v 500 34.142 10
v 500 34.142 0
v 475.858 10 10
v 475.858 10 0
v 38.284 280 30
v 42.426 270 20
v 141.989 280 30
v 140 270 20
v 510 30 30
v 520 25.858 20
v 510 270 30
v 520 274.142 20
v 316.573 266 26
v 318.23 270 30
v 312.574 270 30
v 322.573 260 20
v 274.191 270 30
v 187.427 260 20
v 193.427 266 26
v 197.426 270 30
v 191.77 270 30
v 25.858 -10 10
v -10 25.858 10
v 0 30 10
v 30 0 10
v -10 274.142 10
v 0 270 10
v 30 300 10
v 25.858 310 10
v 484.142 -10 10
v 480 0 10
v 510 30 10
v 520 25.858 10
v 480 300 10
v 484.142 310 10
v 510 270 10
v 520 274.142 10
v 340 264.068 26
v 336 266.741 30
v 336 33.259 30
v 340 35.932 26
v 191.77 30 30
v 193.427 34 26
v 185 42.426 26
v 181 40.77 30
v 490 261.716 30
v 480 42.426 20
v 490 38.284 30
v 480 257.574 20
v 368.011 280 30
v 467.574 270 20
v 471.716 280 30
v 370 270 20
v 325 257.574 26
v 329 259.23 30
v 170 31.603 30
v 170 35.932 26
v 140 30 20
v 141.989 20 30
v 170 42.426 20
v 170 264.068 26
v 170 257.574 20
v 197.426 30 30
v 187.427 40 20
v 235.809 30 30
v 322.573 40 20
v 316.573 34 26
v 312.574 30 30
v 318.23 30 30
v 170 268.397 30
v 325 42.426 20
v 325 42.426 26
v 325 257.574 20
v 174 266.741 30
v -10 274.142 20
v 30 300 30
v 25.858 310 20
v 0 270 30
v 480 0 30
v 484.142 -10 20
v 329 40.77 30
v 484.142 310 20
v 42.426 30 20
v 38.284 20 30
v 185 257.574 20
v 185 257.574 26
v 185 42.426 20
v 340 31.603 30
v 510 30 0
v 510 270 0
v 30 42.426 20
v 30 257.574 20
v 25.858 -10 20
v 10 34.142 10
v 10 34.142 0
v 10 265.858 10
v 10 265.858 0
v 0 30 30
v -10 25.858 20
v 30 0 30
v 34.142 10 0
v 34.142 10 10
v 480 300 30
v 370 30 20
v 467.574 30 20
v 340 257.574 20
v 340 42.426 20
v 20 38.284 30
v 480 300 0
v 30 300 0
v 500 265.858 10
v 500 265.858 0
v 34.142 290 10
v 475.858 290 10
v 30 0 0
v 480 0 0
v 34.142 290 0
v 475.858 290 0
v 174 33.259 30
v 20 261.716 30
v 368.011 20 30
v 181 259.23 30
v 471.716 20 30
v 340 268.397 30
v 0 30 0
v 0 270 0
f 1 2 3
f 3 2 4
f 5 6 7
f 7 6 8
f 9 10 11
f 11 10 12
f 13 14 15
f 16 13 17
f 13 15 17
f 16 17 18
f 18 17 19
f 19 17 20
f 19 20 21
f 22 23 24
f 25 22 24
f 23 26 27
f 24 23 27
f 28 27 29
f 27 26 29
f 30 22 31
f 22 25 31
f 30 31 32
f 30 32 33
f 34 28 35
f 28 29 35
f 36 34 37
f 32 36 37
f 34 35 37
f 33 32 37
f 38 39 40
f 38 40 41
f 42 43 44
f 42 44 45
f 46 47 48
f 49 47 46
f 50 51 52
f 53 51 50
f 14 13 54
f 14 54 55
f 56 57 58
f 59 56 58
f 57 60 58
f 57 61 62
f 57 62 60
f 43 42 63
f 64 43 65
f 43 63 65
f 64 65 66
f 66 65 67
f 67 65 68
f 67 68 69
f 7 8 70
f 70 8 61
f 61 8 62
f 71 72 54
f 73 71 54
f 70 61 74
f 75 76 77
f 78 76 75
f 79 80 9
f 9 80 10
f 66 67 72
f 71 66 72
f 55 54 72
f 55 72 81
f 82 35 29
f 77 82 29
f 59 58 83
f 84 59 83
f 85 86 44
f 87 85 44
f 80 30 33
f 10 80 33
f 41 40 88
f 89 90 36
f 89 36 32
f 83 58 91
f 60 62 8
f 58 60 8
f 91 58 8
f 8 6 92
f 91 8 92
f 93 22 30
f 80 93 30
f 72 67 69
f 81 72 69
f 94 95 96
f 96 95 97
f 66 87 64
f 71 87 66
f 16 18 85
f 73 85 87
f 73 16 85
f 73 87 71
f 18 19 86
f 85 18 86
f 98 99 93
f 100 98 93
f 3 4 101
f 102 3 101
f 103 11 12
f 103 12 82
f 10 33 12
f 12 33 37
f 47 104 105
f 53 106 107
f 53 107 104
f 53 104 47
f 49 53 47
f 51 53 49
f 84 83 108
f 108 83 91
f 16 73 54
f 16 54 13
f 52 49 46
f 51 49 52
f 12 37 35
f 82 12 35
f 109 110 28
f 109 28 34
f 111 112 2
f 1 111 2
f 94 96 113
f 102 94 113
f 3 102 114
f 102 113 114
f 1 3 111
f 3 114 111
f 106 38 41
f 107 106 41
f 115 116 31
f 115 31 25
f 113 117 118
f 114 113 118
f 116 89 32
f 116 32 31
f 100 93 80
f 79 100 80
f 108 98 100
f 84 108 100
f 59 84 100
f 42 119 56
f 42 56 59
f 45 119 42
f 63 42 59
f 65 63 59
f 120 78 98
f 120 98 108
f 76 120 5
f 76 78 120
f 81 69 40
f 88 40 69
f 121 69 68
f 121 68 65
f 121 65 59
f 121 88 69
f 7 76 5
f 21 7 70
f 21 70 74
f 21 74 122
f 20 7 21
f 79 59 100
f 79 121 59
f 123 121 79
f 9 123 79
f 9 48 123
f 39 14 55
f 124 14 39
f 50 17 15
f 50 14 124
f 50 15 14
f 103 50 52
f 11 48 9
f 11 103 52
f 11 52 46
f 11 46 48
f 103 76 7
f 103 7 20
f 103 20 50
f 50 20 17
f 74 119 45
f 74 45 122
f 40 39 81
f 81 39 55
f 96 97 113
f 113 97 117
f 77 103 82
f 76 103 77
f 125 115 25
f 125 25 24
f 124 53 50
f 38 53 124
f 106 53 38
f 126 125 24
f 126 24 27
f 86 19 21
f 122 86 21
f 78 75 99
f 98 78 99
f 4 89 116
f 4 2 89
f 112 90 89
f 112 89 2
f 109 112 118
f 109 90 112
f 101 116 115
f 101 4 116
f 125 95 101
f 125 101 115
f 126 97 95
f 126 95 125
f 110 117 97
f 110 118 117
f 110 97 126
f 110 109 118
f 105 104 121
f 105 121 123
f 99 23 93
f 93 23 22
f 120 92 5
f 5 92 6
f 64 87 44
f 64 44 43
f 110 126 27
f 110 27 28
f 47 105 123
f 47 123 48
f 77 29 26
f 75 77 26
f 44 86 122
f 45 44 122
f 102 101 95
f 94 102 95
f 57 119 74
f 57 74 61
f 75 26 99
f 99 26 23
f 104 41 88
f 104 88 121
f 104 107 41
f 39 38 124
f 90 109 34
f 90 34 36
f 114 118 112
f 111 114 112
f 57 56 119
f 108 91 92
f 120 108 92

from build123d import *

# Parameters (mm, degrees)
BOSS_EXTRU_1_DEPTH      = 10
BOSS_EXTRU_2_DEPTH      = 20
ENL_V_MAT_EXTRU_1_DEPTH = 10
CHANFREIN1_SIZE         = 10
CHANFREIN2_SIZE         = 10
CHANFREIN3_SIZE         = 4


# Some blends are built 0.0001 mm under size
with BuildPart() as part:
    # Esquisse1 → Boss.-Extru.1 (new body)
    with BuildSketch(Plane.XY):
        Polygon((0, 270), (30, 300), (480, 300), (510, 270), (510, 30), (480, 0), (30, 0), (0, 30), align=None)
        Polygon((10, 265.857864376), (34.142135624, 290), (475.857864376, 290), (500, 265.857864376), (500, 34.142135624), (475.857864376, 10), (34.142135624, 10), (10, 34.142135624), align=None, mode=Mode.SUBTRACT)
    extrude(amount=BOSS_EXTRU_1_DEPTH)

    # Esquisse2 → Boss.-Extru.2 (add)
    with BuildSketch(Plane.XY.offset(10)):
        Polygon((484.142135624, 310), (25.857864376, 310), (-10, 274.142135624), (-10, 25.857864376), (25.857864376, -10), (484.142135624, -10), (520, 25.857864376), (520, 274.142135624), align=None)
    extrude(amount=BOSS_EXTRU_2_DEPTH)

    # Esquisse3 → Enlèv. mat.-Extru.1 (cut)
    with BuildSketch(Plane.XY.offset(30)):
        Polygon((42.426406871, 270), (140, 270), (170, 257.573593129), (170, 42.426406871), (140, 30), (42.426406871, 30), (30, 42.426406871), (30, 257.573593129), align=None)
        Polygon((480, 257.573593129), (467.573593129, 270), (370, 270), (340, 257.573593129), (340, 42.426406871), (370, 30), (467.573593129, 30), (480, 42.426406871), align=None)
        Polygon((197.426406871, 270), (185, 257.573593129), (185, 42.426406871), (197.426406871, 30), (312.573593129, 30), (325, 42.426406871), (325, 257.573593129), (312.573593129, 270), (255, 270), align=None)
    extrude(amount=-ENL_V_MAT_EXTRU_1_DEPTH, mode=Mode.SUBTRACT)

    # Chanfrein1
    chanfrein1_edges = [part.edges().sort_by_distance(p)[0] for p in [
        (520, 150, 30),
        (502.071067812, 7.928932188, 30),
        (255, -10, 30),
        (7.928932188, 7.928932188, 30),
        (-10, 150, 30),
        (7.928932188, 292.071067812, 30),
        (255, 310, 30),
        (502.071067812, 292.071067812, 30),
        (473.786796564, 263.786796564, 30),
        (418.786796564, 270, 30),
        (355, 263.786796564, 30),
        (355, 36.213203436, 30),
        (418.786796564, 30, 30),
        (473.786796564, 36.213203436, 30),
        (480, 150, 30),
        (155, 36.213203436, 30),
        (155, 263.786796564, 30),
        (91.213203436, 270, 30),
        (36.213203436, 263.786796564, 30),
        (30, 150, 30),
        (36.213203436, 36.213203436, 30),
        (91.213203436, 30, 30),
    ]]
    chamfer(chanfrein1_edges, length=CHANFREIN1_SIZE - 0.0001)  # a hair under: the kernel refuses the full size

    # Chanfrein2
    chanfrein2_edges = [part.edges().sort_by_distance(p)[0] for p in [
        (255, 30, 20),
        (255, 270, 20),
    ]]
    chamfer(chanfrein2_edges, length=CHANFREIN2_SIZE - 0.0001)  # a hair under: the kernel refuses the full size

    # Chanfrein3
    # the kernel refuses this chamfer: 4 mm, written as the material it takes off along each edge
    with BuildSketch(Plane(origin=(340, 21.315861156, 30), x_dir=(-0.9996219169112968, 0, 0.027495876610586605), z_dir=(0, 1, 0))) as chanfrein3_piece_1_section:
        Polygon((CHANFREIN3_SIZE * 0.999621916911, -CHANFREIN3_SIZE * 0.0274958766106), (-CHANFREIN3_SIZE * 0.0274958766106, -CHANFREIN3_SIZE * 0.999621916911), (0, 0), align=None)
    chanfrein3_piece_1 = extrude(amount=257.368277689, mode=Mode.PRIVATE)
    chanfrein3_piece_1 = split(chanfrein3_piece_1, bisect_by=Plane(origin=(318.097162936, 199.689892736, -25.095613192), z_dir=(0.27059805007309734, -0.6532814824381883, 0.707106781186548)), keep=Keep.TOP, mode=Mode.PRIVATE)
    chanfrein3_piece_1 = split(chanfrein3_piece_1, bisect_by=Plane(origin=(318.097162936, 100.310107264, -25.095613192), z_dir=(0.27059805007309695, 0.6532814824381893, 0.7071067811865472)), keep=Keep.TOP, mode=Mode.PRIVATE)
    add(chanfrein3_piece_1, mode=Mode.SUBTRACT)
    with BuildSketch(Plane(origin=(170, 278.684138844, 30), x_dir=(0.9996219169112968, 0, 0.027495876610586414), z_dir=(0, -1, 0))) as chanfrein3_piece_2_section:
        Polygon((CHANFREIN3_SIZE * 0.999621916911, -CHANFREIN3_SIZE * 0.0274958766106), (-CHANFREIN3_SIZE * 0.0274958766106, -CHANFREIN3_SIZE * 0.999621916911), (0, 0), align=None)
    chanfrein3_piece_2 = extrude(amount=257.368277689, mode=Mode.PRIVATE)
    chanfrein3_piece_2 = split(chanfrein3_piece_2, bisect_by=Plane(origin=(191.902837064, 100.310107264, -25.095613192), z_dir=(-0.27059805007309856, 0.6532814824381883, 0.7071067811865475)), keep=Keep.TOP, mode=Mode.PRIVATE)
    chanfrein3_piece_2 = split(chanfrein3_piece_2, bisect_by=Plane(origin=(191.902837064, 199.689892736, -25.095613192), z_dir=(-0.2705980500730966, -0.6532814824381884, 0.7071067811865482)), keep=Keep.TOP, mode=Mode.PRIVATE)
    add(chanfrein3_piece_2, mode=Mode.SUBTRACT)
    with BuildSketch(Plane(origin=(332.273817919, 250.299775209, 30), x_dir=(-0.019442520806006888, -0.019442520806006888, -0.999621916911297), z_dir=(-0.7071067811865476, 0.7071067811865476, 0))) as chanfrein3_piece_3_section:
        Polygon((CHANFREIN3_SIZE * 0.999621916911, -CHANFREIN3_SIZE * 0.0274958766106), (-CHANFREIN3_SIZE * 0.0274958766106, -CHANFREIN3_SIZE * 0.999621916911), (0, 0), align=None)
    chanfrein3_piece_3 = extrude(amount=38.147057033, mode=Mode.PRIVATE)
    chanfrein3_piece_3 = split(chanfrein3_piece_3, bisect_by=Plane(origin=(320.298394929, 266.355378959, 26.355278959), z_dir=(0, -0.7071067811865467, 0.7071067811865485)), keep=Keep.TOP, mode=Mode.PRIVATE)
    chanfrein3_piece_3 = split(chanfrein3_piece_3, bisect_by=Plane(origin=(320.298394929, 270, 28.707260693), z_dir=(0, -1, 0)), keep=Keep.TOP, mode=Mode.PRIVATE)
    chanfrein3_piece_3 = split(chanfrein3_piece_3, bisect_by=Plane(origin=(325, 264.003397225, 28.707260693), z_dir=(-1, 0, 0)), keep=Keep.TOP, mode=Mode.PRIVATE)
    add(chanfrein3_piece_3, mode=Mode.SUBTRACT)
    with BuildSketch(Plane(origin=(204.700224791, 277.273817919, 30), x_dir=(0.019442520806013792, -0.019442520806013792, -0.9996219169112968), z_dir=(-0.7071067811865476, -0.7071067811865476, 0))) as chanfrein3_piece_4_section:
        Polygon((CHANFREIN3_SIZE * 0.999621916911, -CHANFREIN3_SIZE * 0.0274958766106), (-CHANFREIN3_SIZE * 0.0274958766106, -CHANFREIN3_SIZE * 0.999621916911), (0, 0), align=None)
    chanfrein3_piece_4 = extrude(amount=38.147057033, mode=Mode.PRIVATE)
    chanfrein3_piece_4 = split(chanfrein3_piece_4, bisect_by=Plane(origin=(189.701605071, 270, 28.707260693), z_dir=(0, -1, 0)), keep=Keep.TOP, mode=Mode.PRIVATE)
    chanfrein3_piece_4 = split(chanfrein3_piece_4, bisect_by=Plane(origin=(189.701605071, 266.355378959, 26.355278959), z_dir=(0, -0.7071067811865467, 0.7071067811865485)), keep=Keep.TOP, mode=Mode.PRIVATE)
    chanfrein3_piece_4 = split(chanfrein3_piece_4, bisect_by=Plane(origin=(185, 264.003397225, 28.707260693), z_dir=(1, 0, 0)), keep=Keep.TOP, mode=Mode.PRIVATE)
    add(chanfrein3_piece_4, mode=Mode.SUBTRACT)
    with BuildSketch(Plane(origin=(185, 267.860325081, 30), x_dir=(0.02749587661058907, 0, -0.9996219169112965), z_dir=(0, -1, 0))) as chanfrein3_piece_5_section:
        Polygon((CHANFREIN3_SIZE * 0.999621916911, -CHANFREIN3_SIZE * 0.0274958766106), (-CHANFREIN3_SIZE * 0.0274958766106, -CHANFREIN3_SIZE * 0.999621916911), (0, 0), align=None)
    chanfrein3_piece_5 = extrude(amount=235.720650161, mode=Mode.PRIVATE)
    chanfrein3_piece_5 = split(chanfrein3_piece_5, bisect_by=Plane(origin=(130.558397351, 203.13199048, 28.675713426), z_dir=(0.7071067811865476, -0.7071067811865476, 0)), keep=Keep.TOP, mode=Mode.PRIVATE)
    chanfrein3_piece_5 = split(chanfrein3_piece_5, bisect_by=Plane(origin=(130.558397351, 96.86800952, 28.675713426), z_dir=(0.7071067811865475, 0.7071067811865477, 0)), keep=Keep.TOP, mode=Mode.PRIVATE)
    add(chanfrein3_piece_5, mode=Mode.SUBTRACT)
    with BuildSketch(Plane(origin=(177.726182081, 49.700224791, 30), x_dir=(0.01944252080601465, 0.019442520806014656, -0.9996219169112968), z_dir=(0.7071067811865477, -0.7071067811865475, 0))) as chanfrein3_piece_6_section:
        Polygon((CHANFREIN3_SIZE * 0.999621916911, -CHANFREIN3_SIZE * 0.0274958766106), (-CHANFREIN3_SIZE * 0.0274958766106, -CHANFREIN3_SIZE * 0.999621916911), (0, 0), align=None)
    chanfrein3_piece_6 = extrude(amount=38.147057033, mode=Mode.PRIVATE)
    chanfrein3_piece_6 = split(chanfrein3_piece_6, bisect_by=Plane(origin=(185, 35.996602775, 28.707260693), z_dir=(1, 0, 0)), keep=Keep.TOP, mode=Mode.PRIVATE)
    chanfrein3_piece_6 = split(chanfrein3_piece_6, bisect_by=Plane(origin=(189.701605071, 30, 28.707260693), z_dir=(0, 1, 0)), keep=Keep.TOP, mode=Mode.PRIVATE)
    chanfrein3_piece_6 = split(chanfrein3_piece_6, bisect_by=Plane(origin=(189.701605071, 33.644621041, 26.355278959), z_dir=(0, 0.7071067811865475, 0.7071067811865477)), keep=Keep.TOP, mode=Mode.PRIVATE)
    add(chanfrein3_piece_6, mode=Mode.SUBTRACT)
    with BuildSketch(Plane(origin=(305.299775209, 22.726182081, 30), x_dir=(-0.0194425208060121, 0.01944252080601203, -0.9996219169112968), z_dir=(0.7071067811865464, 0.7071067811865488, 0))) as chanfrein3_piece_7_section:
        Polygon((CHANFREIN3_SIZE * 0.999621916911, -CHANFREIN3_SIZE * 0.0274958766106), (-CHANFREIN3_SIZE * 0.0274958766106, -CHANFREIN3_SIZE * 0.999621916911), (0, 0), align=None)
    chanfrein3_piece_7 = extrude(amount=38.147057033, mode=Mode.PRIVATE)
    chanfrein3_piece_7 = split(chanfrein3_piece_7, bisect_by=Plane(origin=(325, 35.996602775, 28.707260693), z_dir=(-1, 0, 0)), keep=Keep.TOP, mode=Mode.PRIVATE)
    chanfrein3_piece_7 = split(chanfrein3_piece_7, bisect_by=Plane(origin=(320.298394929, 33.644621041, 26.355278959), z_dir=(0, 0.7071067811865475, 0.7071067811865477)), keep=Keep.TOP, mode=Mode.PRIVATE)
    chanfrein3_piece_7 = split(chanfrein3_piece_7, bisect_by=Plane(origin=(320.298394929, 30, 28.707260693), z_dir=(0, 1, 0)), keep=Keep.TOP, mode=Mode.PRIVATE)
    add(chanfrein3_piece_7, mode=Mode.SUBTRACT)
    with BuildSketch(Plane(origin=(325, 32.139674919, 30), x_dir=(-0.02749587661058217, 0, -0.9996219169112968), z_dir=(0, 1, 0))) as chanfrein3_piece_8_section:
        Polygon((CHANFREIN3_SIZE * 0.999621916911, -CHANFREIN3_SIZE * 0.0274958766106), (-CHANFREIN3_SIZE * 0.0274958766106, -CHANFREIN3_SIZE * 0.999621916911), (0, 0), align=None)
    chanfrein3_piece_8 = extrude(amount=235.720650161, mode=Mode.PRIVATE)
    chanfrein3_piece_8 = split(chanfrein3_piece_8, bisect_by=Plane(origin=(379.441602649, 203.13199048, 28.675713426), z_dir=(-0.7071067811865476, -0.7071067811865476, 0)), keep=Keep.TOP, mode=Mode.PRIVATE)
    chanfrein3_piece_8 = split(chanfrein3_piece_8, bisect_by=Plane(origin=(379.441602649, 96.86800952, 28.675713426), z_dir=(-0.7071067811865488, 0.7071067811865464, 0)), keep=Keep.TOP, mode=Mode.PRIVATE)
    add(chanfrein3_piece_8, mode=Mode.SUBTRACT)
    with BuildSketch(Plane(origin=(332.273817919, 250.299775209, 30), x_dir=(-0.019442520806006888, -0.019442520806006888, -0.999621916911297), z_dir=(-0.7071067811865476, 0.7071067811865476, 0))) as chanfrein3_piece_9a_section:
        Polygon((CHANFREIN3_SIZE * 0.999621916911, -CHANFREIN3_SIZE * 0.0274958766106), (-CHANFREIN3_SIZE * 0.0274958766106, -CHANFREIN3_SIZE * 0.999621916911), (0, 0), align=None)
    chanfrein3_piece_9a = extrude(amount=38.147057033, mode=Mode.PRIVATE)
    chanfrein3_piece_9a = split(chanfrein3_piece_9a, bisect_by=Plane(origin=(325, 255.42873567, 28.7276275), z_dir=(1, 0, 0)), keep=Keep.TOP, mode=Mode.PRIVATE)
    with BuildSketch(Plane(origin=(325, 32.139674919, 30), x_dir=(-0.02749587661058217, 0, -0.9996219169112968), z_dir=(0, 1, 0))) as chanfrein3_piece_9b_section:
        Polygon((CHANFREIN3_SIZE * 0.999621916911, -CHANFREIN3_SIZE * 0.0274958766106), (-CHANFREIN3_SIZE * 0.0274958766106, -CHANFREIN3_SIZE * 0.999621916911), (0, 0), align=None)
    chanfrein3_piece_9b = extrude(amount=235.720650161, mode=Mode.PRIVATE)
    chanfrein3_piece_9b = split(chanfrein3_piece_9b, bisect_by=Plane(origin=(323.483356746, 259.090236382, 28.7276275), z_dir=(0.7071067811865476, 0.7071067811865476, 0)), keep=Keep.TOP, mode=Mode.PRIVATE)
    chanfrein3_piece_9 = chanfrein3_piece_9a & chanfrein3_piece_9b
    add(chanfrein3_piece_9, mode=Mode.SUBTRACT)
    with BuildSketch(Plane(origin=(204.700224791, 277.273817919, 30), x_dir=(0.019442520806013792, -0.019442520806013792, -0.9996219169112968), z_dir=(-0.7071067811865476, -0.7071067811865476, 0))) as chanfrein3_piece_10a_section:
        Polygon((CHANFREIN3_SIZE * 0.999621916911, -CHANFREIN3_SIZE * 0.0274958766106), (-CHANFREIN3_SIZE * 0.0274958766106, -CHANFREIN3_SIZE * 0.999621916911), (0, 0), align=None)
    chanfrein3_piece_10a = extrude(amount=38.147057033, mode=Mode.PRIVATE)
    chanfrein3_piece_10a = split(chanfrein3_piece_10a, bisect_by=Plane(origin=(185, 255.42873567, 28.7276275), z_dir=(-1, 0, 0)), keep=Keep.TOP, mode=Mode.PRIVATE)
    with BuildSketch(Plane(origin=(185, 267.860325081, 30), x_dir=(0.02749587661058907, 0, -0.9996219169112965), z_dir=(0, -1, 0))) as chanfrein3_piece_10b_section:
        Polygon((CHANFREIN3_SIZE * 0.999621916911, -CHANFREIN3_SIZE * 0.0274958766106), (-CHANFREIN3_SIZE * 0.0274958766106, -CHANFREIN3_SIZE * 0.999621916911), (0, 0), align=None)
    chanfrein3_piece_10b = extrude(amount=235.720650161, mode=Mode.PRIVATE)
    chanfrein3_piece_10b = split(chanfrein3_piece_10b, bisect_by=Plane(origin=(186.516643254, 259.090236382, 28.7276275), z_dir=(-0.7071067811865476, 0.7071067811865476, 0)), keep=Keep.TOP, mode=Mode.PRIVATE)
    chanfrein3_piece_10 = chanfrein3_piece_10a & chanfrein3_piece_10b
    add(chanfrein3_piece_10, mode=Mode.SUBTRACT)
    with BuildSketch(Plane(origin=(185, 267.860325081, 30), x_dir=(0.02749587661058907, 0, -0.9996219169112965), z_dir=(0, -1, 0))) as chanfrein3_piece_11a_section:
        Polygon((CHANFREIN3_SIZE * 0.999621916911, -CHANFREIN3_SIZE * 0.0274958766106), (-CHANFREIN3_SIZE * 0.0274958766106, -CHANFREIN3_SIZE * 0.999621916911), (0, 0), align=None)
    chanfrein3_piece_11a = extrude(amount=235.720650161, mode=Mode.PRIVATE)
    chanfrein3_piece_11a = split(chanfrein3_piece_11a, bisect_by=Plane(origin=(186.516643254, 40.909763618, 28.7276275), z_dir=(-0.7071067811865475, -0.7071067811865477, 0)), keep=Keep.TOP, mode=Mode.PRIVATE)
    with BuildSketch(Plane(origin=(177.726182081, 49.700224791, 30), x_dir=(0.01944252080601465, 0.019442520806014656, -0.9996219169112968), z_dir=(0.7071067811865477, -0.7071067811865475, 0))) as chanfrein3_piece_11b_section:
        Polygon((CHANFREIN3_SIZE * 0.999621916911, -CHANFREIN3_SIZE * 0.0274958766106), (-CHANFREIN3_SIZE * 0.0274958766106, -CHANFREIN3_SIZE * 0.999621916911), (0, 0), align=None)
    chanfrein3_piece_11b = extrude(amount=38.147057033, mode=Mode.PRIVATE)
    chanfrein3_piece_11b = split(chanfrein3_piece_11b, bisect_by=Plane(origin=(185, 44.57126433, 28.7276275), z_dir=(-1, 0, 0)), keep=Keep.TOP, mode=Mode.PRIVATE)
    chanfrein3_piece_11 = chanfrein3_piece_11a & chanfrein3_piece_11b
    add(chanfrein3_piece_11, mode=Mode.SUBTRACT)
    with BuildSketch(Plane(origin=(325, 32.139674919, 30), x_dir=(-0.02749587661058217, 0, -0.9996219169112968), z_dir=(0, 1, 0))) as chanfrein3_piece_12a_section:
        Polygon((CHANFREIN3_SIZE * 0.999621916911, -CHANFREIN3_SIZE * 0.0274958766106), (-CHANFREIN3_SIZE * 0.0274958766106, -CHANFREIN3_SIZE * 0.999621916911), (0, 0), align=None)
    chanfrein3_piece_12a = extrude(amount=235.720650161, mode=Mode.PRIVATE)
    chanfrein3_piece_12a = split(chanfrein3_piece_12a, bisect_by=Plane(origin=(323.483356746, 40.909763618, 28.7276275), z_dir=(0.7071067811865488, -0.7071067811865464, 0)), keep=Keep.TOP, mode=Mode.PRIVATE)
    with BuildSketch(Plane(origin=(305.299775209, 22.726182081, 30), x_dir=(-0.0194425208060121, 0.01944252080601203, -0.9996219169112968), z_dir=(0.7071067811865464, 0.7071067811865488, 0))) as chanfrein3_piece_12b_section:
        Polygon((CHANFREIN3_SIZE * 0.999621916911, -CHANFREIN3_SIZE * 0.0274958766106), (-CHANFREIN3_SIZE * 0.0274958766106, -CHANFREIN3_SIZE * 0.999621916911), (0, 0), align=None)
    chanfrein3_piece_12b = extrude(amount=38.147057033, mode=Mode.PRIVATE)
    chanfrein3_piece_12b = split(chanfrein3_piece_12b, bisect_by=Plane(origin=(325, 44.57126433, 28.7276275), z_dir=(1, 0, 0)), keep=Keep.TOP, mode=Mode.PRIVATE)
    chanfrein3_piece_12 = chanfrein3_piece_12a & chanfrein3_piece_12b
    add(chanfrein3_piece_12, mode=Mode.SUBTRACT)


solid = part.part
